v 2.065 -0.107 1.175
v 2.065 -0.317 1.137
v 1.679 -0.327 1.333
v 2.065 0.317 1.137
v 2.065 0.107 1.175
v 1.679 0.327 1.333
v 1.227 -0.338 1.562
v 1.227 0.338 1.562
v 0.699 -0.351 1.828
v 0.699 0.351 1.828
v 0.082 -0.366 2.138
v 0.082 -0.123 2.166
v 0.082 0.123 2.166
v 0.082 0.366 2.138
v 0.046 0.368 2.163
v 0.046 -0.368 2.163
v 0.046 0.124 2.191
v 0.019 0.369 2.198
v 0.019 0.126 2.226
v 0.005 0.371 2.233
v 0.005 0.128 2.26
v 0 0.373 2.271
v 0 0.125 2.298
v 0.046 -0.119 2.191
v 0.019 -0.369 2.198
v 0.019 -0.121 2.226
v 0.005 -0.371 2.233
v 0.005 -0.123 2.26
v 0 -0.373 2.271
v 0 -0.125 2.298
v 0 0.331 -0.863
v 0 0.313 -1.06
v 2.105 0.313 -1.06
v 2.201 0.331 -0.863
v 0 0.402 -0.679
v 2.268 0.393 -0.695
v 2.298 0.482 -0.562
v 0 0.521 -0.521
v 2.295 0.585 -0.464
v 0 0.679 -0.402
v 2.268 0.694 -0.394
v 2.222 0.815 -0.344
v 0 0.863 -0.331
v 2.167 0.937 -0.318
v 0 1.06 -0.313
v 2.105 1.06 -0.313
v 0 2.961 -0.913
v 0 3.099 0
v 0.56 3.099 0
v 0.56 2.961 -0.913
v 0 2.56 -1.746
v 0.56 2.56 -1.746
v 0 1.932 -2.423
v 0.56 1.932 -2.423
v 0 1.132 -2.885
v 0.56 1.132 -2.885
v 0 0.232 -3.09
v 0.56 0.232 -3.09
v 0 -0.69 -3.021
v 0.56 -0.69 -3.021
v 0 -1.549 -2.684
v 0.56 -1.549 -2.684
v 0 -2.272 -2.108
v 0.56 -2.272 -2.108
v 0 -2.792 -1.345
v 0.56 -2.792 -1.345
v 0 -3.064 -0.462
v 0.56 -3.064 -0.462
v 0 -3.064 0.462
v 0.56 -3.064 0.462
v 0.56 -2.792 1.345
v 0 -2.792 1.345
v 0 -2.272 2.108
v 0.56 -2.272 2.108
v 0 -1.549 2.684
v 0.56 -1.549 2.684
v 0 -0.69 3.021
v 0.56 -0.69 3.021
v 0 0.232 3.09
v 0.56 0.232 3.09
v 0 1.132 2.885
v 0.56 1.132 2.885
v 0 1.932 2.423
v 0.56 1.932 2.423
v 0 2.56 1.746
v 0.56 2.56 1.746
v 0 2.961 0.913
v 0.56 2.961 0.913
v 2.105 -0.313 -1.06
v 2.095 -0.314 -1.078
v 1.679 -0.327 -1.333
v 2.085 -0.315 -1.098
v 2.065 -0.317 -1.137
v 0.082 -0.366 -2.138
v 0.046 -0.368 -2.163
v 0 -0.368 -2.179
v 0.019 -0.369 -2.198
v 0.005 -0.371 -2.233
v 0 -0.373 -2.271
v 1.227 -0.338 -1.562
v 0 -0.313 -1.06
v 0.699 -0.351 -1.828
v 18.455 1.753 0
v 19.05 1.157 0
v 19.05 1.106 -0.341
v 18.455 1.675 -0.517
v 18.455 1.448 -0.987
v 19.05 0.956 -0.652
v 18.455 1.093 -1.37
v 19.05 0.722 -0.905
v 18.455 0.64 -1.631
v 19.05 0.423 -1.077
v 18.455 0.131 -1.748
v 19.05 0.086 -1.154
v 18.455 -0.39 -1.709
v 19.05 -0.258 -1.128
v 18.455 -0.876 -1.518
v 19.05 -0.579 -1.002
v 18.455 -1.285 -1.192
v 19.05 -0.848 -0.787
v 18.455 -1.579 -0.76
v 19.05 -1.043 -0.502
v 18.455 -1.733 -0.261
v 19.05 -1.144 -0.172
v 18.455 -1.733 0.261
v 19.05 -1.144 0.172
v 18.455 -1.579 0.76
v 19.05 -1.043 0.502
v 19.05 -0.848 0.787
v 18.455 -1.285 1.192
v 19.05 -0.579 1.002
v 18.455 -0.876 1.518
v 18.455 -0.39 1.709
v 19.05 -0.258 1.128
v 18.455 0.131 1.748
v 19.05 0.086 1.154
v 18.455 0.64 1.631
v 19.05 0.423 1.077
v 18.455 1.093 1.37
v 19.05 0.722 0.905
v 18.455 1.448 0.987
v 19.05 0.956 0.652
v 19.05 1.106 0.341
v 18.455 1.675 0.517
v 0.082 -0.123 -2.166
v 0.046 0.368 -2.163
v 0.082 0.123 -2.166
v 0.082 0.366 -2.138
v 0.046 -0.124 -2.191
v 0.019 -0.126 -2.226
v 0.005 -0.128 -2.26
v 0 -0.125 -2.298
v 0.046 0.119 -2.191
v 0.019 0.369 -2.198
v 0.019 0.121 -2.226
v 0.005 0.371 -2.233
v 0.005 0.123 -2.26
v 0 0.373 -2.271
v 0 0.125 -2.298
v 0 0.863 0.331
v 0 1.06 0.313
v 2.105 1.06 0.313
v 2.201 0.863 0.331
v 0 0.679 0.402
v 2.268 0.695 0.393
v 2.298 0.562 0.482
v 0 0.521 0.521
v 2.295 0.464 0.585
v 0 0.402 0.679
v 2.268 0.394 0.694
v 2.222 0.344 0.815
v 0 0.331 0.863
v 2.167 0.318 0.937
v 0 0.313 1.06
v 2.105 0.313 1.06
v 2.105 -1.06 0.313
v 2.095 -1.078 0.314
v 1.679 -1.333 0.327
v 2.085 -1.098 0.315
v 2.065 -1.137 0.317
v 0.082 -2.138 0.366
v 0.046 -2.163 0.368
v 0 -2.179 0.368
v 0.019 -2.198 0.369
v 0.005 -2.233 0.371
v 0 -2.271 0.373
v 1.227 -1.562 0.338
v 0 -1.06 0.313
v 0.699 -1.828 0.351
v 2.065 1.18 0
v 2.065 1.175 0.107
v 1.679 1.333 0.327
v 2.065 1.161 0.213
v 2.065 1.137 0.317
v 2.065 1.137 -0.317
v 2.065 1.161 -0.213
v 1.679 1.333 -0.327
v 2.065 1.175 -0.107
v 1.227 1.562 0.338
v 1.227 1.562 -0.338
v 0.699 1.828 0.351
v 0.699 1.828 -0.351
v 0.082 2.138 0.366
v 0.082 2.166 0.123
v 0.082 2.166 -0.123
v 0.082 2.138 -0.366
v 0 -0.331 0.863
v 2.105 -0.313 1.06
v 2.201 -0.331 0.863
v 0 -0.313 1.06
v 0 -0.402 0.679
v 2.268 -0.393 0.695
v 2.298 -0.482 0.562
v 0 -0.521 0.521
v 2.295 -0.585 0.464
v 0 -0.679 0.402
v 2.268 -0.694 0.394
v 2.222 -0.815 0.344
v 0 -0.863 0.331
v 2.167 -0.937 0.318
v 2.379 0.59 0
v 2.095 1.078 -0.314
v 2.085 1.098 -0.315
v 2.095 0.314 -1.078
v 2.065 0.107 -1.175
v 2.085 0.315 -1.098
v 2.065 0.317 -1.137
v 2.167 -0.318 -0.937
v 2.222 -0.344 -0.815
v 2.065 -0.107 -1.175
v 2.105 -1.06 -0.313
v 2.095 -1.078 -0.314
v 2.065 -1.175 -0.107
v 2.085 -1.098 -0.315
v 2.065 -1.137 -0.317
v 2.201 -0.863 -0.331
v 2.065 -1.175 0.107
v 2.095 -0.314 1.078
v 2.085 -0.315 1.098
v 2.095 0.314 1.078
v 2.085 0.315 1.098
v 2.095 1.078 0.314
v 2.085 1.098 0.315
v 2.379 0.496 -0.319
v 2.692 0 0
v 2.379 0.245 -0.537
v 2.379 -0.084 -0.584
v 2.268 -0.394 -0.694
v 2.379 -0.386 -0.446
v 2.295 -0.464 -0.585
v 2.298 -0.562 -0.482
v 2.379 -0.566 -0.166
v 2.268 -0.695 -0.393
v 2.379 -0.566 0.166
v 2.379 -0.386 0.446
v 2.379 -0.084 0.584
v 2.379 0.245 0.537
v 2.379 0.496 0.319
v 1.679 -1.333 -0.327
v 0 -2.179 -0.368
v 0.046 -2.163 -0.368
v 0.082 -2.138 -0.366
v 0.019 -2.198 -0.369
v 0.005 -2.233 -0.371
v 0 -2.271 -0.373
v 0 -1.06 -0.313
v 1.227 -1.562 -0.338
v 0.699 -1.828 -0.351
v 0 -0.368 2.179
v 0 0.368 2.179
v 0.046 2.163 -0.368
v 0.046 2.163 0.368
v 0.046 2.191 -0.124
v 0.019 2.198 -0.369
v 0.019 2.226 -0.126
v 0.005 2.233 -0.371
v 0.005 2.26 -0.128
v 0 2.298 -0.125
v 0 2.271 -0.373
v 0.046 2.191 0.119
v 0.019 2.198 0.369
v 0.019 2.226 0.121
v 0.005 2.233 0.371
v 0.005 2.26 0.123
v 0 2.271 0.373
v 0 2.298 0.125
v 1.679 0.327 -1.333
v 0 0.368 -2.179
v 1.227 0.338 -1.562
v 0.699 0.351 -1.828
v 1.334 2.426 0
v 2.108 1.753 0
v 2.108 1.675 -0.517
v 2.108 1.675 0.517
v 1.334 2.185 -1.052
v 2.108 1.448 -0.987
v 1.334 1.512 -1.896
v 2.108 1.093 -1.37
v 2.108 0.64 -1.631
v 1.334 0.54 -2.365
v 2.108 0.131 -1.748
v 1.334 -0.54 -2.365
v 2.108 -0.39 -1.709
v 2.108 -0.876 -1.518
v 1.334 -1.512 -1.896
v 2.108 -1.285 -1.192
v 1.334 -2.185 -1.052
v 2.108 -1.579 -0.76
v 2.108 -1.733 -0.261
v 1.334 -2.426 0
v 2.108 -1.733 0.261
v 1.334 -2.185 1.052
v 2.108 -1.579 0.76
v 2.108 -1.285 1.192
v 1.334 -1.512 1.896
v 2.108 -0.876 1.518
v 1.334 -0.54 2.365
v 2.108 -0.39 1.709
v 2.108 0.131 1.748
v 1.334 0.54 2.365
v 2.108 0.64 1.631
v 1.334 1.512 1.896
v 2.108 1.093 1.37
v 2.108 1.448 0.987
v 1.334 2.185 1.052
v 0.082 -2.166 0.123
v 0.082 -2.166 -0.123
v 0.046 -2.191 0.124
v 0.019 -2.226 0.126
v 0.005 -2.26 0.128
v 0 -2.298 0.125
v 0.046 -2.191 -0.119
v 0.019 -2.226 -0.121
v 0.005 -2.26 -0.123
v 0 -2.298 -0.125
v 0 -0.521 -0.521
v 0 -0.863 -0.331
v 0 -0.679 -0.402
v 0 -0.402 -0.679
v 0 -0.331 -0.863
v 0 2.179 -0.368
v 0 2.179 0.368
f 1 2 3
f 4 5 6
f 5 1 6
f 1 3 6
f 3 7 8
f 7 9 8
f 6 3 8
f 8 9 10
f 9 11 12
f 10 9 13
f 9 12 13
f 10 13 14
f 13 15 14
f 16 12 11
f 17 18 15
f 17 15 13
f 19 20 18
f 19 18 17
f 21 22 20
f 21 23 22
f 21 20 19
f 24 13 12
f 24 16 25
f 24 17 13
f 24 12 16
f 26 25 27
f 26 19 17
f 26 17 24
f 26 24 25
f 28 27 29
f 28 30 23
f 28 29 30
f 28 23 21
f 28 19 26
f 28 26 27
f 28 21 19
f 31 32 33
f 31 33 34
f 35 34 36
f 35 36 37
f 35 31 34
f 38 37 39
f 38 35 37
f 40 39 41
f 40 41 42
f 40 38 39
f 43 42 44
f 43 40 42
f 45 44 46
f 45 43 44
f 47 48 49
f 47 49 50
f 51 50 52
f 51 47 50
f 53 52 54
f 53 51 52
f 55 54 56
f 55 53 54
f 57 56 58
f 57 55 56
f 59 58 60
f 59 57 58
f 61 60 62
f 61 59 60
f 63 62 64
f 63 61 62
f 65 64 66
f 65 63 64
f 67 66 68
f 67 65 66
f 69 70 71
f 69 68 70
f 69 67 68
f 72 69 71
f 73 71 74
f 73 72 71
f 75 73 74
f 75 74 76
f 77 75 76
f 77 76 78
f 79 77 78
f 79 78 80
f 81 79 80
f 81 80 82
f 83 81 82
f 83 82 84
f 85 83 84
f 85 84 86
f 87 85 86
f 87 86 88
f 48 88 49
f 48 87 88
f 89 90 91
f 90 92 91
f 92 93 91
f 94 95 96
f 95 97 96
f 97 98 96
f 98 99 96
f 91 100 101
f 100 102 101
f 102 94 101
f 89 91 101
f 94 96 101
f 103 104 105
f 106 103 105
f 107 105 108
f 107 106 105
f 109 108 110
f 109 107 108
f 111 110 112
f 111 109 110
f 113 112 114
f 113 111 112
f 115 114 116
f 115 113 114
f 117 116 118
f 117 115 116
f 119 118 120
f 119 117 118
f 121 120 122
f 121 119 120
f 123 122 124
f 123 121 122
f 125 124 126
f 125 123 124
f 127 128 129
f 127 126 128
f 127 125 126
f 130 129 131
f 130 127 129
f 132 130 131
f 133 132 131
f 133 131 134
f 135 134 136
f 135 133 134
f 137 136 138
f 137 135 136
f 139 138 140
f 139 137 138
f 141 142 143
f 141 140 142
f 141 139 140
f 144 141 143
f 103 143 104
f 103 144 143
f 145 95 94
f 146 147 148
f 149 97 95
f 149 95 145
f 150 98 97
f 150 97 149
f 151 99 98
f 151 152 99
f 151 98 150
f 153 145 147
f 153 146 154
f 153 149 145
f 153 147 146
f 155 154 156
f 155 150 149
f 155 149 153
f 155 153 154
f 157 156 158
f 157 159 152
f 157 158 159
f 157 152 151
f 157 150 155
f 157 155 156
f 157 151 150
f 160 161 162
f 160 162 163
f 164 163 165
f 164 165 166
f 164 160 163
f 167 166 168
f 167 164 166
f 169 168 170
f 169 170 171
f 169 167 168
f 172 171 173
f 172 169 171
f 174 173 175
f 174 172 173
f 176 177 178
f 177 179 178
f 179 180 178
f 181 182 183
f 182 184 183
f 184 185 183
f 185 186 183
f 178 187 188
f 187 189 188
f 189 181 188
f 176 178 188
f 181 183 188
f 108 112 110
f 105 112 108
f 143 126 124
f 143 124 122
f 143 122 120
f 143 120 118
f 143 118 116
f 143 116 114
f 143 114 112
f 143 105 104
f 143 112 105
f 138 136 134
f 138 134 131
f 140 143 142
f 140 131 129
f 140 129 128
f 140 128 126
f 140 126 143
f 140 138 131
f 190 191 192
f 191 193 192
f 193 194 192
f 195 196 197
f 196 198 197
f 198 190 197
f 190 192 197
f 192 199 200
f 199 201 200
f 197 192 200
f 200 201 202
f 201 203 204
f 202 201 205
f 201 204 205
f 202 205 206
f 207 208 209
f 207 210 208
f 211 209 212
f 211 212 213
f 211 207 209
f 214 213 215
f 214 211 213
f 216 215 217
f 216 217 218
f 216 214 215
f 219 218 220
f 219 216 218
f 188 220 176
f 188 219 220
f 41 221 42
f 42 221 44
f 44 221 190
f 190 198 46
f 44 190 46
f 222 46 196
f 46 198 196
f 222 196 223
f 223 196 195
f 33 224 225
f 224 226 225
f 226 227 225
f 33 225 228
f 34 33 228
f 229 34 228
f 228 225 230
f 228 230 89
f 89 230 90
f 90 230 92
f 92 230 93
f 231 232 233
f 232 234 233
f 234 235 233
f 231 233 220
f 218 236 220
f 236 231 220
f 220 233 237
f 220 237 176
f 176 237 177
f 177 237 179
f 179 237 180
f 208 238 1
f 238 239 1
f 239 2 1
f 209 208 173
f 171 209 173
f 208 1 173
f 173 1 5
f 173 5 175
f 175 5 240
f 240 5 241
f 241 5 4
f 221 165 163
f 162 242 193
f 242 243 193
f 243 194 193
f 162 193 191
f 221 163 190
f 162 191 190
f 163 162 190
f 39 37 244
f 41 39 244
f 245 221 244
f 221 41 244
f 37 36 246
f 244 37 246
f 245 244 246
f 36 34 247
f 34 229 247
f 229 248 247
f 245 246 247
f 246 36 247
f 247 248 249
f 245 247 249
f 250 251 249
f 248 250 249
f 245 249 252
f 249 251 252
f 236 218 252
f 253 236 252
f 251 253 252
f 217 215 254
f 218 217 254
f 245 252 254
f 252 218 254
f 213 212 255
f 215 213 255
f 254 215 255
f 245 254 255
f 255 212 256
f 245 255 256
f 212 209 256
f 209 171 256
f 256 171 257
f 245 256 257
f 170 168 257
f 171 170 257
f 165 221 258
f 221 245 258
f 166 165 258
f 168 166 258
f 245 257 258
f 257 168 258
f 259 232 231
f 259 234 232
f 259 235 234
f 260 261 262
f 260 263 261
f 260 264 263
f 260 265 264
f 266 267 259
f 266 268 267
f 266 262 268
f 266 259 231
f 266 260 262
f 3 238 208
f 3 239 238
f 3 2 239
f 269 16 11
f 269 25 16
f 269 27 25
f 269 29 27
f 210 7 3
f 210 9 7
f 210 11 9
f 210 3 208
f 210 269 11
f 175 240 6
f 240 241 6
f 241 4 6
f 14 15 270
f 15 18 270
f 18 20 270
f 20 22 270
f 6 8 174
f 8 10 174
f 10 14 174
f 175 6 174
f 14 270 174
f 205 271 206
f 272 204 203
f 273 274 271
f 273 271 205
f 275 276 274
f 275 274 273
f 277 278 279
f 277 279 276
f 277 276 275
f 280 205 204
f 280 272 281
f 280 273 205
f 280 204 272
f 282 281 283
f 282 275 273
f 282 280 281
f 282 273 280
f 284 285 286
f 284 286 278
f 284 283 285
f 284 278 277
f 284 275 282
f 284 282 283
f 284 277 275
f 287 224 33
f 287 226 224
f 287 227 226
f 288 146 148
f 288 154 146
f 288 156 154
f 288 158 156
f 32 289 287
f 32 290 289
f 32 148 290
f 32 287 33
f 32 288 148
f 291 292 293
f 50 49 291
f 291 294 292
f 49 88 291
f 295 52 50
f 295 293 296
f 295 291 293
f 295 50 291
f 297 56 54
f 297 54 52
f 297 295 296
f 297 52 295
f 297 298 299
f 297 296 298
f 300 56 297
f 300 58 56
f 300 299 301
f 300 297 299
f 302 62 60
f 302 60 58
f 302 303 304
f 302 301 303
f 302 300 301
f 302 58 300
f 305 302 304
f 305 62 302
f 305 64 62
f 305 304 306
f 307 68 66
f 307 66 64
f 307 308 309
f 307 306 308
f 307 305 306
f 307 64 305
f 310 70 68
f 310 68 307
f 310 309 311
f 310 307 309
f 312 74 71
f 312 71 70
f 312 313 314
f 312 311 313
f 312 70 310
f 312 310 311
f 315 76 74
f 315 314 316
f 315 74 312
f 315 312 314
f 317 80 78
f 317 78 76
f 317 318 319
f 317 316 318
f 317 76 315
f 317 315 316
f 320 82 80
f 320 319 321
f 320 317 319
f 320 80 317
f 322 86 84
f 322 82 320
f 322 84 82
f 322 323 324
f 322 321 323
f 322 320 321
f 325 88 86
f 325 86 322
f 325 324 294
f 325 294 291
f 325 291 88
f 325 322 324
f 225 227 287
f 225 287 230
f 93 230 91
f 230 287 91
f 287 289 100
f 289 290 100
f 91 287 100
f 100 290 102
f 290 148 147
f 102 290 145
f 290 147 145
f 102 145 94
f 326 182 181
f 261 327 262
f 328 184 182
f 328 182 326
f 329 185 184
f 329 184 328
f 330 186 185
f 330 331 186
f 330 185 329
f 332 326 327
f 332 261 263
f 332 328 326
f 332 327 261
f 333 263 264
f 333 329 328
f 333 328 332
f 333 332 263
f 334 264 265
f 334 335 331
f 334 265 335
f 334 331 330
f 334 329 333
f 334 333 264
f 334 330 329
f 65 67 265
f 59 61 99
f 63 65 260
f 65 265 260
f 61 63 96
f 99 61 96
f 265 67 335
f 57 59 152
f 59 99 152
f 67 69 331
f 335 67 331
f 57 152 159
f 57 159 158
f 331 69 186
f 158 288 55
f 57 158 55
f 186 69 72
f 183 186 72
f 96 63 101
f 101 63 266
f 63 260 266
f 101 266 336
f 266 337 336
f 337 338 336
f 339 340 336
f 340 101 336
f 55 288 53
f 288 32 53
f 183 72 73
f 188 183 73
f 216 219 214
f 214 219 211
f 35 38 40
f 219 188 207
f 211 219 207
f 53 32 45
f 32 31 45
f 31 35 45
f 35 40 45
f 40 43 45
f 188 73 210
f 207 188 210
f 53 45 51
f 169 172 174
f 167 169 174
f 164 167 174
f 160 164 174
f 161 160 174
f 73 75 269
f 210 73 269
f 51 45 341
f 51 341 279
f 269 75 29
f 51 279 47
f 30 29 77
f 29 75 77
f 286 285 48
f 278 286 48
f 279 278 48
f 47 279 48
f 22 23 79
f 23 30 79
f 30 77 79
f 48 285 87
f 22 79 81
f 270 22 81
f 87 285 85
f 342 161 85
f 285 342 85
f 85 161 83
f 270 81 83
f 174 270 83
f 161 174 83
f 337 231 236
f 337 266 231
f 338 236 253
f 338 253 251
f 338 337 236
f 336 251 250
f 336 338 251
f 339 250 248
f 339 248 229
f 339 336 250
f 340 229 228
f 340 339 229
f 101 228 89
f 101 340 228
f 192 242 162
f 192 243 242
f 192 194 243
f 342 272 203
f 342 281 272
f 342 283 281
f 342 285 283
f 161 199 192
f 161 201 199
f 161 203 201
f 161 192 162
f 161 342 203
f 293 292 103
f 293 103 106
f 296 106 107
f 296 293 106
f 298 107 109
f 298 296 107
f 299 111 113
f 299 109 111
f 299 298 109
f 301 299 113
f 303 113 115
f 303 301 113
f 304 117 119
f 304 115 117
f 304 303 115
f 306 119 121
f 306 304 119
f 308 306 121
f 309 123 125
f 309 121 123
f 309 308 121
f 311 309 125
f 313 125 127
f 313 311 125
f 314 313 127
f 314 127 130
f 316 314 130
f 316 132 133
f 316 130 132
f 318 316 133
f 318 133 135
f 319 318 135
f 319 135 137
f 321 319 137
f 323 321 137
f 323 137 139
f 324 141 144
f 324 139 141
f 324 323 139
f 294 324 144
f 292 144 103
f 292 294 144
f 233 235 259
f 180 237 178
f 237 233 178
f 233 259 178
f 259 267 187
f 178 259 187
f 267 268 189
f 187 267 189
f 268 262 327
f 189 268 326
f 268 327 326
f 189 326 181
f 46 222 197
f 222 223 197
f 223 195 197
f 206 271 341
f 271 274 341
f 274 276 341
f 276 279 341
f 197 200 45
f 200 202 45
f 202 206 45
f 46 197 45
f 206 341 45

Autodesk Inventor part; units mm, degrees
ref_plane "YZ Plane" through (0, 0, 0) normal (1, 0, 0) x (0, 1, 0)
ref_plane "XZ Plane" through (0, 0, 0) normal (0, 1, 0) x (-1, 0, 0)
sketch "Sketch1" plane through (0, 0, 0) normal (0, 0, 1) x (1, 0, 0)
  line L0 (2.6924, 0) -> (19.05, 0)
  line L1 (19.05, 0) -> (19.05, 1.7526)
  line L2 (19.05, 1.7526) -> (2.1082, 1.7526)
  line L3 (0.5596, 3.0988) -> (0, 3.0988)
  line L4 (-3.81, 0) -> (22.86, 0) projected
  line L5 (0, -0.6198) -> (0, 3.7186) projected
  line L6 (0, 2.2098) -> (2.0648, 1.1803)
  line L7 (2.0648, 1.1803) -> (2.6924, 0)
  line L8 (2.1082, 1.7526) -> (0.5596, 3.0988)
  line L9 (0, 3.0988) -> (0, 2.2098)
  dimension "d2" = 3.5052
  dimension "d3" = 6.1976
  dimension "d4" = 2.6924
  dimension "d5" = 4.4196
  dimension "d6" = 26.5
  dimension "d7" = 62
  dimension "d13" = 41
  dimension "d14" = 2.1082
  dimension "d15" = 19.05
revolve "Body" add sketch "Sketch1" angle 360 about axis through (2.6924, 0, 0) along (1, 0, 0) contours L7 L6 L5 L3 L8 L2 L1 L0
sketch "Sketch2" plane through (0, 0, 0) normal (-1, 0, 0) x (0, 0, 1)
  line L0 (0, -4.3383) -> (0, 4.3383) projected
  line L1 (-4.3383, 0) -> (4.3383, 0) projected
  line L2 (0, 2.2098) -> (0, 0) construction
  line L3 (0, 0) -> (2.2098, 0) construction
  arc A0 (0.7366, 0) -> (0, 0.7366) centre (0, 0) ccw
  line L4 (0, 0) -> (0.7947, 0.7947) construction
  arc A1 (1.1049, 0) -> (0, 1.1049) centre (0, 0) ccw construction
  line L5 (0.3683, 2.1789) -> (0.3131, 1.0596)
  line L6 (2.1789, 0.3683) -> (1.0596, 0.3131)
  arc A2 (0.3131, 1.0596) -> (1.0596, 0.3131) centre (1.0245, 1.0245) ccw
  arc A3 (2.2098, 0) -> (2.1789, 0.3683) centre (0, 0) ccw
  arc A4 (0.3683, 2.1789) -> (0, 2.2098) centre (0, 0) ccw
  arc A5 (2.1789, 0.3683) -> (0.3683, 2.1789) centre (0, 0) ccw
  line L7 (0.3683, -2.1789) -> (0.3131, -1.0596)
  line L8 (2.1789, -0.3683) -> (1.0596, -0.3131)
  arc A6 (1.0596, -0.3131) -> (0.3131, -1.0596) centre (1.0245, -1.0245) ccw
  arc A7 (2.1789, -0.3683) -> (2.2098, 0) centre (0, 0) ccw
  arc A8 (0, -2.2098) -> (0.3683, -2.1789) centre (0, 0) ccw
  arc A9 (0.3683, -2.1789) -> (2.1789, -0.3683) centre (0, 0) ccw
  line L9 (-0.3683, 2.1789) -> (-0.3131, 1.0596)
  line L10 (-2.1789, 0.3683) -> (-1.0596, 0.3131)
  arc A10 (-1.0596, 0.3131) -> (-0.3131, 1.0596) centre (-1.0245, 1.0245) ccw
  arc A11 (-2.1789, 0.3683) -> (-2.2098, 0) centre (0, 0) ccw
  arc A12 (0, 2.2098) -> (-0.3683, 2.1789) centre (0, 0) ccw
  arc A13 (-0.3683, 2.1789) -> (-2.1789, 0.3683) centre (0, 0) ccw
  arc A14 (-2.1789, -0.3683) -> (-0.3683, -2.1789) centre (0, 0) ccw
  arc A15 (-0.3683, -2.1789) -> (0, -2.2098) centre (0, 0) ccw
  arc A16 (-2.2098, 0) -> (-2.1789, -0.3683) centre (0, 0) ccw
  line L11 (-2.1789, -0.3683) -> (-1.0596, -0.3131)
  arc A17 (-0.3131, -1.0596) -> (-1.0596, -0.3131) centre (-1.0245, -1.0245) ccw
  line L12 (-0.3683, -2.1789) -> (-0.3131, -1.0596)
  dimension "d18" = 45
  dimension "d19" = 1.4732
  dimension "d20" = 2.2098
  dimension "d21" = 4.4196
  dimension "d22" = 0.3683
extrude "Slot" add sketch "Sketch2" against normal up to next contours A2 L5 A5 L6 | L9 A10 L10 A13 | L7 A6 L8 A9 | A14 L11 A17 L12
fillet "Fillet1" radius 0.1473 4 edges at (0, 2.2098, 0) (0, 0, 2.2098) (0, -2.2098, 0) (0, 0, -2.2098)
thread "Thread" size "6-32 UNC" class "2A" standard "ANSI Unified Screw Threads" length 14.9574
chamfer "Chamfer1" distance 0.5953 distance2 0.5953 1 edges at (19.05, -1.7526, 0) measured on face at (19.05, -0.3126, 0.4528)
ref_plane "Work Plane2" through (2.032, 0, 0) normal (0, 1, 0) x (1, 0, 0)
equation "\"d2\" = GD"
equation "\"d3\" = KOD"
equation "\"d4\" = INTI"
equation "\"d5\" = SDM"
equation "\"d13\" = 0.5 * SEWI"
equation "\"d14\" = KOH"
equation "\"d15\" = NLG"
equation "\"d19\" = 0.333333 * SDM"
equation "\"d20\" = 0.5 * SDM"
equation "\"d21\" = SDM"
equation "\"d22\" = 0.5 * SBR"
equation "\"d45\" = INTI"
equation "\"d25\" = 0.2 * SBR"
equation "\"d9\" = GEL"
equation "\"d11\" = -0.5 * SPD + 0.5 * GD"
equation "\"d12\" = GUL"
equation "\"GD\" = NND"
equation "\"NLG\" = 19.05"
equation "\"GEL\" = 14.95743"
equation "\"KOD\" = 6.1976"
equation "\"KOH\" = 2.1082"
equation "\"SDM\" = 4.4196"
equation "\"INTI\" = 2.6924"
equation "\"SBR\" = 0.7366"
equation "\"GUL\" = 0.75 * GAL"
equation "\"SPD\" = 2.31458"
equation "\"SEWI\" = 82deg"
equation "\"d0\" = NLG"
equation "\"d1\" = KOH"
equation "\"d17\" = SDM"
equation "\"TOA\" = 30deg"
equation "\"THREADDIA\" = 3.5052"
equation "\"BDM\" = NND"
equation "\"NND\" = 3.5052"
equation "\"GAL\" = 0.79375"
equation "\"GD1\" = SPD"
properties part number "ANSI B18.6.3 - 6-32 x 3/4, CRFCHMSTII(5)" material "Steel, Mild"
